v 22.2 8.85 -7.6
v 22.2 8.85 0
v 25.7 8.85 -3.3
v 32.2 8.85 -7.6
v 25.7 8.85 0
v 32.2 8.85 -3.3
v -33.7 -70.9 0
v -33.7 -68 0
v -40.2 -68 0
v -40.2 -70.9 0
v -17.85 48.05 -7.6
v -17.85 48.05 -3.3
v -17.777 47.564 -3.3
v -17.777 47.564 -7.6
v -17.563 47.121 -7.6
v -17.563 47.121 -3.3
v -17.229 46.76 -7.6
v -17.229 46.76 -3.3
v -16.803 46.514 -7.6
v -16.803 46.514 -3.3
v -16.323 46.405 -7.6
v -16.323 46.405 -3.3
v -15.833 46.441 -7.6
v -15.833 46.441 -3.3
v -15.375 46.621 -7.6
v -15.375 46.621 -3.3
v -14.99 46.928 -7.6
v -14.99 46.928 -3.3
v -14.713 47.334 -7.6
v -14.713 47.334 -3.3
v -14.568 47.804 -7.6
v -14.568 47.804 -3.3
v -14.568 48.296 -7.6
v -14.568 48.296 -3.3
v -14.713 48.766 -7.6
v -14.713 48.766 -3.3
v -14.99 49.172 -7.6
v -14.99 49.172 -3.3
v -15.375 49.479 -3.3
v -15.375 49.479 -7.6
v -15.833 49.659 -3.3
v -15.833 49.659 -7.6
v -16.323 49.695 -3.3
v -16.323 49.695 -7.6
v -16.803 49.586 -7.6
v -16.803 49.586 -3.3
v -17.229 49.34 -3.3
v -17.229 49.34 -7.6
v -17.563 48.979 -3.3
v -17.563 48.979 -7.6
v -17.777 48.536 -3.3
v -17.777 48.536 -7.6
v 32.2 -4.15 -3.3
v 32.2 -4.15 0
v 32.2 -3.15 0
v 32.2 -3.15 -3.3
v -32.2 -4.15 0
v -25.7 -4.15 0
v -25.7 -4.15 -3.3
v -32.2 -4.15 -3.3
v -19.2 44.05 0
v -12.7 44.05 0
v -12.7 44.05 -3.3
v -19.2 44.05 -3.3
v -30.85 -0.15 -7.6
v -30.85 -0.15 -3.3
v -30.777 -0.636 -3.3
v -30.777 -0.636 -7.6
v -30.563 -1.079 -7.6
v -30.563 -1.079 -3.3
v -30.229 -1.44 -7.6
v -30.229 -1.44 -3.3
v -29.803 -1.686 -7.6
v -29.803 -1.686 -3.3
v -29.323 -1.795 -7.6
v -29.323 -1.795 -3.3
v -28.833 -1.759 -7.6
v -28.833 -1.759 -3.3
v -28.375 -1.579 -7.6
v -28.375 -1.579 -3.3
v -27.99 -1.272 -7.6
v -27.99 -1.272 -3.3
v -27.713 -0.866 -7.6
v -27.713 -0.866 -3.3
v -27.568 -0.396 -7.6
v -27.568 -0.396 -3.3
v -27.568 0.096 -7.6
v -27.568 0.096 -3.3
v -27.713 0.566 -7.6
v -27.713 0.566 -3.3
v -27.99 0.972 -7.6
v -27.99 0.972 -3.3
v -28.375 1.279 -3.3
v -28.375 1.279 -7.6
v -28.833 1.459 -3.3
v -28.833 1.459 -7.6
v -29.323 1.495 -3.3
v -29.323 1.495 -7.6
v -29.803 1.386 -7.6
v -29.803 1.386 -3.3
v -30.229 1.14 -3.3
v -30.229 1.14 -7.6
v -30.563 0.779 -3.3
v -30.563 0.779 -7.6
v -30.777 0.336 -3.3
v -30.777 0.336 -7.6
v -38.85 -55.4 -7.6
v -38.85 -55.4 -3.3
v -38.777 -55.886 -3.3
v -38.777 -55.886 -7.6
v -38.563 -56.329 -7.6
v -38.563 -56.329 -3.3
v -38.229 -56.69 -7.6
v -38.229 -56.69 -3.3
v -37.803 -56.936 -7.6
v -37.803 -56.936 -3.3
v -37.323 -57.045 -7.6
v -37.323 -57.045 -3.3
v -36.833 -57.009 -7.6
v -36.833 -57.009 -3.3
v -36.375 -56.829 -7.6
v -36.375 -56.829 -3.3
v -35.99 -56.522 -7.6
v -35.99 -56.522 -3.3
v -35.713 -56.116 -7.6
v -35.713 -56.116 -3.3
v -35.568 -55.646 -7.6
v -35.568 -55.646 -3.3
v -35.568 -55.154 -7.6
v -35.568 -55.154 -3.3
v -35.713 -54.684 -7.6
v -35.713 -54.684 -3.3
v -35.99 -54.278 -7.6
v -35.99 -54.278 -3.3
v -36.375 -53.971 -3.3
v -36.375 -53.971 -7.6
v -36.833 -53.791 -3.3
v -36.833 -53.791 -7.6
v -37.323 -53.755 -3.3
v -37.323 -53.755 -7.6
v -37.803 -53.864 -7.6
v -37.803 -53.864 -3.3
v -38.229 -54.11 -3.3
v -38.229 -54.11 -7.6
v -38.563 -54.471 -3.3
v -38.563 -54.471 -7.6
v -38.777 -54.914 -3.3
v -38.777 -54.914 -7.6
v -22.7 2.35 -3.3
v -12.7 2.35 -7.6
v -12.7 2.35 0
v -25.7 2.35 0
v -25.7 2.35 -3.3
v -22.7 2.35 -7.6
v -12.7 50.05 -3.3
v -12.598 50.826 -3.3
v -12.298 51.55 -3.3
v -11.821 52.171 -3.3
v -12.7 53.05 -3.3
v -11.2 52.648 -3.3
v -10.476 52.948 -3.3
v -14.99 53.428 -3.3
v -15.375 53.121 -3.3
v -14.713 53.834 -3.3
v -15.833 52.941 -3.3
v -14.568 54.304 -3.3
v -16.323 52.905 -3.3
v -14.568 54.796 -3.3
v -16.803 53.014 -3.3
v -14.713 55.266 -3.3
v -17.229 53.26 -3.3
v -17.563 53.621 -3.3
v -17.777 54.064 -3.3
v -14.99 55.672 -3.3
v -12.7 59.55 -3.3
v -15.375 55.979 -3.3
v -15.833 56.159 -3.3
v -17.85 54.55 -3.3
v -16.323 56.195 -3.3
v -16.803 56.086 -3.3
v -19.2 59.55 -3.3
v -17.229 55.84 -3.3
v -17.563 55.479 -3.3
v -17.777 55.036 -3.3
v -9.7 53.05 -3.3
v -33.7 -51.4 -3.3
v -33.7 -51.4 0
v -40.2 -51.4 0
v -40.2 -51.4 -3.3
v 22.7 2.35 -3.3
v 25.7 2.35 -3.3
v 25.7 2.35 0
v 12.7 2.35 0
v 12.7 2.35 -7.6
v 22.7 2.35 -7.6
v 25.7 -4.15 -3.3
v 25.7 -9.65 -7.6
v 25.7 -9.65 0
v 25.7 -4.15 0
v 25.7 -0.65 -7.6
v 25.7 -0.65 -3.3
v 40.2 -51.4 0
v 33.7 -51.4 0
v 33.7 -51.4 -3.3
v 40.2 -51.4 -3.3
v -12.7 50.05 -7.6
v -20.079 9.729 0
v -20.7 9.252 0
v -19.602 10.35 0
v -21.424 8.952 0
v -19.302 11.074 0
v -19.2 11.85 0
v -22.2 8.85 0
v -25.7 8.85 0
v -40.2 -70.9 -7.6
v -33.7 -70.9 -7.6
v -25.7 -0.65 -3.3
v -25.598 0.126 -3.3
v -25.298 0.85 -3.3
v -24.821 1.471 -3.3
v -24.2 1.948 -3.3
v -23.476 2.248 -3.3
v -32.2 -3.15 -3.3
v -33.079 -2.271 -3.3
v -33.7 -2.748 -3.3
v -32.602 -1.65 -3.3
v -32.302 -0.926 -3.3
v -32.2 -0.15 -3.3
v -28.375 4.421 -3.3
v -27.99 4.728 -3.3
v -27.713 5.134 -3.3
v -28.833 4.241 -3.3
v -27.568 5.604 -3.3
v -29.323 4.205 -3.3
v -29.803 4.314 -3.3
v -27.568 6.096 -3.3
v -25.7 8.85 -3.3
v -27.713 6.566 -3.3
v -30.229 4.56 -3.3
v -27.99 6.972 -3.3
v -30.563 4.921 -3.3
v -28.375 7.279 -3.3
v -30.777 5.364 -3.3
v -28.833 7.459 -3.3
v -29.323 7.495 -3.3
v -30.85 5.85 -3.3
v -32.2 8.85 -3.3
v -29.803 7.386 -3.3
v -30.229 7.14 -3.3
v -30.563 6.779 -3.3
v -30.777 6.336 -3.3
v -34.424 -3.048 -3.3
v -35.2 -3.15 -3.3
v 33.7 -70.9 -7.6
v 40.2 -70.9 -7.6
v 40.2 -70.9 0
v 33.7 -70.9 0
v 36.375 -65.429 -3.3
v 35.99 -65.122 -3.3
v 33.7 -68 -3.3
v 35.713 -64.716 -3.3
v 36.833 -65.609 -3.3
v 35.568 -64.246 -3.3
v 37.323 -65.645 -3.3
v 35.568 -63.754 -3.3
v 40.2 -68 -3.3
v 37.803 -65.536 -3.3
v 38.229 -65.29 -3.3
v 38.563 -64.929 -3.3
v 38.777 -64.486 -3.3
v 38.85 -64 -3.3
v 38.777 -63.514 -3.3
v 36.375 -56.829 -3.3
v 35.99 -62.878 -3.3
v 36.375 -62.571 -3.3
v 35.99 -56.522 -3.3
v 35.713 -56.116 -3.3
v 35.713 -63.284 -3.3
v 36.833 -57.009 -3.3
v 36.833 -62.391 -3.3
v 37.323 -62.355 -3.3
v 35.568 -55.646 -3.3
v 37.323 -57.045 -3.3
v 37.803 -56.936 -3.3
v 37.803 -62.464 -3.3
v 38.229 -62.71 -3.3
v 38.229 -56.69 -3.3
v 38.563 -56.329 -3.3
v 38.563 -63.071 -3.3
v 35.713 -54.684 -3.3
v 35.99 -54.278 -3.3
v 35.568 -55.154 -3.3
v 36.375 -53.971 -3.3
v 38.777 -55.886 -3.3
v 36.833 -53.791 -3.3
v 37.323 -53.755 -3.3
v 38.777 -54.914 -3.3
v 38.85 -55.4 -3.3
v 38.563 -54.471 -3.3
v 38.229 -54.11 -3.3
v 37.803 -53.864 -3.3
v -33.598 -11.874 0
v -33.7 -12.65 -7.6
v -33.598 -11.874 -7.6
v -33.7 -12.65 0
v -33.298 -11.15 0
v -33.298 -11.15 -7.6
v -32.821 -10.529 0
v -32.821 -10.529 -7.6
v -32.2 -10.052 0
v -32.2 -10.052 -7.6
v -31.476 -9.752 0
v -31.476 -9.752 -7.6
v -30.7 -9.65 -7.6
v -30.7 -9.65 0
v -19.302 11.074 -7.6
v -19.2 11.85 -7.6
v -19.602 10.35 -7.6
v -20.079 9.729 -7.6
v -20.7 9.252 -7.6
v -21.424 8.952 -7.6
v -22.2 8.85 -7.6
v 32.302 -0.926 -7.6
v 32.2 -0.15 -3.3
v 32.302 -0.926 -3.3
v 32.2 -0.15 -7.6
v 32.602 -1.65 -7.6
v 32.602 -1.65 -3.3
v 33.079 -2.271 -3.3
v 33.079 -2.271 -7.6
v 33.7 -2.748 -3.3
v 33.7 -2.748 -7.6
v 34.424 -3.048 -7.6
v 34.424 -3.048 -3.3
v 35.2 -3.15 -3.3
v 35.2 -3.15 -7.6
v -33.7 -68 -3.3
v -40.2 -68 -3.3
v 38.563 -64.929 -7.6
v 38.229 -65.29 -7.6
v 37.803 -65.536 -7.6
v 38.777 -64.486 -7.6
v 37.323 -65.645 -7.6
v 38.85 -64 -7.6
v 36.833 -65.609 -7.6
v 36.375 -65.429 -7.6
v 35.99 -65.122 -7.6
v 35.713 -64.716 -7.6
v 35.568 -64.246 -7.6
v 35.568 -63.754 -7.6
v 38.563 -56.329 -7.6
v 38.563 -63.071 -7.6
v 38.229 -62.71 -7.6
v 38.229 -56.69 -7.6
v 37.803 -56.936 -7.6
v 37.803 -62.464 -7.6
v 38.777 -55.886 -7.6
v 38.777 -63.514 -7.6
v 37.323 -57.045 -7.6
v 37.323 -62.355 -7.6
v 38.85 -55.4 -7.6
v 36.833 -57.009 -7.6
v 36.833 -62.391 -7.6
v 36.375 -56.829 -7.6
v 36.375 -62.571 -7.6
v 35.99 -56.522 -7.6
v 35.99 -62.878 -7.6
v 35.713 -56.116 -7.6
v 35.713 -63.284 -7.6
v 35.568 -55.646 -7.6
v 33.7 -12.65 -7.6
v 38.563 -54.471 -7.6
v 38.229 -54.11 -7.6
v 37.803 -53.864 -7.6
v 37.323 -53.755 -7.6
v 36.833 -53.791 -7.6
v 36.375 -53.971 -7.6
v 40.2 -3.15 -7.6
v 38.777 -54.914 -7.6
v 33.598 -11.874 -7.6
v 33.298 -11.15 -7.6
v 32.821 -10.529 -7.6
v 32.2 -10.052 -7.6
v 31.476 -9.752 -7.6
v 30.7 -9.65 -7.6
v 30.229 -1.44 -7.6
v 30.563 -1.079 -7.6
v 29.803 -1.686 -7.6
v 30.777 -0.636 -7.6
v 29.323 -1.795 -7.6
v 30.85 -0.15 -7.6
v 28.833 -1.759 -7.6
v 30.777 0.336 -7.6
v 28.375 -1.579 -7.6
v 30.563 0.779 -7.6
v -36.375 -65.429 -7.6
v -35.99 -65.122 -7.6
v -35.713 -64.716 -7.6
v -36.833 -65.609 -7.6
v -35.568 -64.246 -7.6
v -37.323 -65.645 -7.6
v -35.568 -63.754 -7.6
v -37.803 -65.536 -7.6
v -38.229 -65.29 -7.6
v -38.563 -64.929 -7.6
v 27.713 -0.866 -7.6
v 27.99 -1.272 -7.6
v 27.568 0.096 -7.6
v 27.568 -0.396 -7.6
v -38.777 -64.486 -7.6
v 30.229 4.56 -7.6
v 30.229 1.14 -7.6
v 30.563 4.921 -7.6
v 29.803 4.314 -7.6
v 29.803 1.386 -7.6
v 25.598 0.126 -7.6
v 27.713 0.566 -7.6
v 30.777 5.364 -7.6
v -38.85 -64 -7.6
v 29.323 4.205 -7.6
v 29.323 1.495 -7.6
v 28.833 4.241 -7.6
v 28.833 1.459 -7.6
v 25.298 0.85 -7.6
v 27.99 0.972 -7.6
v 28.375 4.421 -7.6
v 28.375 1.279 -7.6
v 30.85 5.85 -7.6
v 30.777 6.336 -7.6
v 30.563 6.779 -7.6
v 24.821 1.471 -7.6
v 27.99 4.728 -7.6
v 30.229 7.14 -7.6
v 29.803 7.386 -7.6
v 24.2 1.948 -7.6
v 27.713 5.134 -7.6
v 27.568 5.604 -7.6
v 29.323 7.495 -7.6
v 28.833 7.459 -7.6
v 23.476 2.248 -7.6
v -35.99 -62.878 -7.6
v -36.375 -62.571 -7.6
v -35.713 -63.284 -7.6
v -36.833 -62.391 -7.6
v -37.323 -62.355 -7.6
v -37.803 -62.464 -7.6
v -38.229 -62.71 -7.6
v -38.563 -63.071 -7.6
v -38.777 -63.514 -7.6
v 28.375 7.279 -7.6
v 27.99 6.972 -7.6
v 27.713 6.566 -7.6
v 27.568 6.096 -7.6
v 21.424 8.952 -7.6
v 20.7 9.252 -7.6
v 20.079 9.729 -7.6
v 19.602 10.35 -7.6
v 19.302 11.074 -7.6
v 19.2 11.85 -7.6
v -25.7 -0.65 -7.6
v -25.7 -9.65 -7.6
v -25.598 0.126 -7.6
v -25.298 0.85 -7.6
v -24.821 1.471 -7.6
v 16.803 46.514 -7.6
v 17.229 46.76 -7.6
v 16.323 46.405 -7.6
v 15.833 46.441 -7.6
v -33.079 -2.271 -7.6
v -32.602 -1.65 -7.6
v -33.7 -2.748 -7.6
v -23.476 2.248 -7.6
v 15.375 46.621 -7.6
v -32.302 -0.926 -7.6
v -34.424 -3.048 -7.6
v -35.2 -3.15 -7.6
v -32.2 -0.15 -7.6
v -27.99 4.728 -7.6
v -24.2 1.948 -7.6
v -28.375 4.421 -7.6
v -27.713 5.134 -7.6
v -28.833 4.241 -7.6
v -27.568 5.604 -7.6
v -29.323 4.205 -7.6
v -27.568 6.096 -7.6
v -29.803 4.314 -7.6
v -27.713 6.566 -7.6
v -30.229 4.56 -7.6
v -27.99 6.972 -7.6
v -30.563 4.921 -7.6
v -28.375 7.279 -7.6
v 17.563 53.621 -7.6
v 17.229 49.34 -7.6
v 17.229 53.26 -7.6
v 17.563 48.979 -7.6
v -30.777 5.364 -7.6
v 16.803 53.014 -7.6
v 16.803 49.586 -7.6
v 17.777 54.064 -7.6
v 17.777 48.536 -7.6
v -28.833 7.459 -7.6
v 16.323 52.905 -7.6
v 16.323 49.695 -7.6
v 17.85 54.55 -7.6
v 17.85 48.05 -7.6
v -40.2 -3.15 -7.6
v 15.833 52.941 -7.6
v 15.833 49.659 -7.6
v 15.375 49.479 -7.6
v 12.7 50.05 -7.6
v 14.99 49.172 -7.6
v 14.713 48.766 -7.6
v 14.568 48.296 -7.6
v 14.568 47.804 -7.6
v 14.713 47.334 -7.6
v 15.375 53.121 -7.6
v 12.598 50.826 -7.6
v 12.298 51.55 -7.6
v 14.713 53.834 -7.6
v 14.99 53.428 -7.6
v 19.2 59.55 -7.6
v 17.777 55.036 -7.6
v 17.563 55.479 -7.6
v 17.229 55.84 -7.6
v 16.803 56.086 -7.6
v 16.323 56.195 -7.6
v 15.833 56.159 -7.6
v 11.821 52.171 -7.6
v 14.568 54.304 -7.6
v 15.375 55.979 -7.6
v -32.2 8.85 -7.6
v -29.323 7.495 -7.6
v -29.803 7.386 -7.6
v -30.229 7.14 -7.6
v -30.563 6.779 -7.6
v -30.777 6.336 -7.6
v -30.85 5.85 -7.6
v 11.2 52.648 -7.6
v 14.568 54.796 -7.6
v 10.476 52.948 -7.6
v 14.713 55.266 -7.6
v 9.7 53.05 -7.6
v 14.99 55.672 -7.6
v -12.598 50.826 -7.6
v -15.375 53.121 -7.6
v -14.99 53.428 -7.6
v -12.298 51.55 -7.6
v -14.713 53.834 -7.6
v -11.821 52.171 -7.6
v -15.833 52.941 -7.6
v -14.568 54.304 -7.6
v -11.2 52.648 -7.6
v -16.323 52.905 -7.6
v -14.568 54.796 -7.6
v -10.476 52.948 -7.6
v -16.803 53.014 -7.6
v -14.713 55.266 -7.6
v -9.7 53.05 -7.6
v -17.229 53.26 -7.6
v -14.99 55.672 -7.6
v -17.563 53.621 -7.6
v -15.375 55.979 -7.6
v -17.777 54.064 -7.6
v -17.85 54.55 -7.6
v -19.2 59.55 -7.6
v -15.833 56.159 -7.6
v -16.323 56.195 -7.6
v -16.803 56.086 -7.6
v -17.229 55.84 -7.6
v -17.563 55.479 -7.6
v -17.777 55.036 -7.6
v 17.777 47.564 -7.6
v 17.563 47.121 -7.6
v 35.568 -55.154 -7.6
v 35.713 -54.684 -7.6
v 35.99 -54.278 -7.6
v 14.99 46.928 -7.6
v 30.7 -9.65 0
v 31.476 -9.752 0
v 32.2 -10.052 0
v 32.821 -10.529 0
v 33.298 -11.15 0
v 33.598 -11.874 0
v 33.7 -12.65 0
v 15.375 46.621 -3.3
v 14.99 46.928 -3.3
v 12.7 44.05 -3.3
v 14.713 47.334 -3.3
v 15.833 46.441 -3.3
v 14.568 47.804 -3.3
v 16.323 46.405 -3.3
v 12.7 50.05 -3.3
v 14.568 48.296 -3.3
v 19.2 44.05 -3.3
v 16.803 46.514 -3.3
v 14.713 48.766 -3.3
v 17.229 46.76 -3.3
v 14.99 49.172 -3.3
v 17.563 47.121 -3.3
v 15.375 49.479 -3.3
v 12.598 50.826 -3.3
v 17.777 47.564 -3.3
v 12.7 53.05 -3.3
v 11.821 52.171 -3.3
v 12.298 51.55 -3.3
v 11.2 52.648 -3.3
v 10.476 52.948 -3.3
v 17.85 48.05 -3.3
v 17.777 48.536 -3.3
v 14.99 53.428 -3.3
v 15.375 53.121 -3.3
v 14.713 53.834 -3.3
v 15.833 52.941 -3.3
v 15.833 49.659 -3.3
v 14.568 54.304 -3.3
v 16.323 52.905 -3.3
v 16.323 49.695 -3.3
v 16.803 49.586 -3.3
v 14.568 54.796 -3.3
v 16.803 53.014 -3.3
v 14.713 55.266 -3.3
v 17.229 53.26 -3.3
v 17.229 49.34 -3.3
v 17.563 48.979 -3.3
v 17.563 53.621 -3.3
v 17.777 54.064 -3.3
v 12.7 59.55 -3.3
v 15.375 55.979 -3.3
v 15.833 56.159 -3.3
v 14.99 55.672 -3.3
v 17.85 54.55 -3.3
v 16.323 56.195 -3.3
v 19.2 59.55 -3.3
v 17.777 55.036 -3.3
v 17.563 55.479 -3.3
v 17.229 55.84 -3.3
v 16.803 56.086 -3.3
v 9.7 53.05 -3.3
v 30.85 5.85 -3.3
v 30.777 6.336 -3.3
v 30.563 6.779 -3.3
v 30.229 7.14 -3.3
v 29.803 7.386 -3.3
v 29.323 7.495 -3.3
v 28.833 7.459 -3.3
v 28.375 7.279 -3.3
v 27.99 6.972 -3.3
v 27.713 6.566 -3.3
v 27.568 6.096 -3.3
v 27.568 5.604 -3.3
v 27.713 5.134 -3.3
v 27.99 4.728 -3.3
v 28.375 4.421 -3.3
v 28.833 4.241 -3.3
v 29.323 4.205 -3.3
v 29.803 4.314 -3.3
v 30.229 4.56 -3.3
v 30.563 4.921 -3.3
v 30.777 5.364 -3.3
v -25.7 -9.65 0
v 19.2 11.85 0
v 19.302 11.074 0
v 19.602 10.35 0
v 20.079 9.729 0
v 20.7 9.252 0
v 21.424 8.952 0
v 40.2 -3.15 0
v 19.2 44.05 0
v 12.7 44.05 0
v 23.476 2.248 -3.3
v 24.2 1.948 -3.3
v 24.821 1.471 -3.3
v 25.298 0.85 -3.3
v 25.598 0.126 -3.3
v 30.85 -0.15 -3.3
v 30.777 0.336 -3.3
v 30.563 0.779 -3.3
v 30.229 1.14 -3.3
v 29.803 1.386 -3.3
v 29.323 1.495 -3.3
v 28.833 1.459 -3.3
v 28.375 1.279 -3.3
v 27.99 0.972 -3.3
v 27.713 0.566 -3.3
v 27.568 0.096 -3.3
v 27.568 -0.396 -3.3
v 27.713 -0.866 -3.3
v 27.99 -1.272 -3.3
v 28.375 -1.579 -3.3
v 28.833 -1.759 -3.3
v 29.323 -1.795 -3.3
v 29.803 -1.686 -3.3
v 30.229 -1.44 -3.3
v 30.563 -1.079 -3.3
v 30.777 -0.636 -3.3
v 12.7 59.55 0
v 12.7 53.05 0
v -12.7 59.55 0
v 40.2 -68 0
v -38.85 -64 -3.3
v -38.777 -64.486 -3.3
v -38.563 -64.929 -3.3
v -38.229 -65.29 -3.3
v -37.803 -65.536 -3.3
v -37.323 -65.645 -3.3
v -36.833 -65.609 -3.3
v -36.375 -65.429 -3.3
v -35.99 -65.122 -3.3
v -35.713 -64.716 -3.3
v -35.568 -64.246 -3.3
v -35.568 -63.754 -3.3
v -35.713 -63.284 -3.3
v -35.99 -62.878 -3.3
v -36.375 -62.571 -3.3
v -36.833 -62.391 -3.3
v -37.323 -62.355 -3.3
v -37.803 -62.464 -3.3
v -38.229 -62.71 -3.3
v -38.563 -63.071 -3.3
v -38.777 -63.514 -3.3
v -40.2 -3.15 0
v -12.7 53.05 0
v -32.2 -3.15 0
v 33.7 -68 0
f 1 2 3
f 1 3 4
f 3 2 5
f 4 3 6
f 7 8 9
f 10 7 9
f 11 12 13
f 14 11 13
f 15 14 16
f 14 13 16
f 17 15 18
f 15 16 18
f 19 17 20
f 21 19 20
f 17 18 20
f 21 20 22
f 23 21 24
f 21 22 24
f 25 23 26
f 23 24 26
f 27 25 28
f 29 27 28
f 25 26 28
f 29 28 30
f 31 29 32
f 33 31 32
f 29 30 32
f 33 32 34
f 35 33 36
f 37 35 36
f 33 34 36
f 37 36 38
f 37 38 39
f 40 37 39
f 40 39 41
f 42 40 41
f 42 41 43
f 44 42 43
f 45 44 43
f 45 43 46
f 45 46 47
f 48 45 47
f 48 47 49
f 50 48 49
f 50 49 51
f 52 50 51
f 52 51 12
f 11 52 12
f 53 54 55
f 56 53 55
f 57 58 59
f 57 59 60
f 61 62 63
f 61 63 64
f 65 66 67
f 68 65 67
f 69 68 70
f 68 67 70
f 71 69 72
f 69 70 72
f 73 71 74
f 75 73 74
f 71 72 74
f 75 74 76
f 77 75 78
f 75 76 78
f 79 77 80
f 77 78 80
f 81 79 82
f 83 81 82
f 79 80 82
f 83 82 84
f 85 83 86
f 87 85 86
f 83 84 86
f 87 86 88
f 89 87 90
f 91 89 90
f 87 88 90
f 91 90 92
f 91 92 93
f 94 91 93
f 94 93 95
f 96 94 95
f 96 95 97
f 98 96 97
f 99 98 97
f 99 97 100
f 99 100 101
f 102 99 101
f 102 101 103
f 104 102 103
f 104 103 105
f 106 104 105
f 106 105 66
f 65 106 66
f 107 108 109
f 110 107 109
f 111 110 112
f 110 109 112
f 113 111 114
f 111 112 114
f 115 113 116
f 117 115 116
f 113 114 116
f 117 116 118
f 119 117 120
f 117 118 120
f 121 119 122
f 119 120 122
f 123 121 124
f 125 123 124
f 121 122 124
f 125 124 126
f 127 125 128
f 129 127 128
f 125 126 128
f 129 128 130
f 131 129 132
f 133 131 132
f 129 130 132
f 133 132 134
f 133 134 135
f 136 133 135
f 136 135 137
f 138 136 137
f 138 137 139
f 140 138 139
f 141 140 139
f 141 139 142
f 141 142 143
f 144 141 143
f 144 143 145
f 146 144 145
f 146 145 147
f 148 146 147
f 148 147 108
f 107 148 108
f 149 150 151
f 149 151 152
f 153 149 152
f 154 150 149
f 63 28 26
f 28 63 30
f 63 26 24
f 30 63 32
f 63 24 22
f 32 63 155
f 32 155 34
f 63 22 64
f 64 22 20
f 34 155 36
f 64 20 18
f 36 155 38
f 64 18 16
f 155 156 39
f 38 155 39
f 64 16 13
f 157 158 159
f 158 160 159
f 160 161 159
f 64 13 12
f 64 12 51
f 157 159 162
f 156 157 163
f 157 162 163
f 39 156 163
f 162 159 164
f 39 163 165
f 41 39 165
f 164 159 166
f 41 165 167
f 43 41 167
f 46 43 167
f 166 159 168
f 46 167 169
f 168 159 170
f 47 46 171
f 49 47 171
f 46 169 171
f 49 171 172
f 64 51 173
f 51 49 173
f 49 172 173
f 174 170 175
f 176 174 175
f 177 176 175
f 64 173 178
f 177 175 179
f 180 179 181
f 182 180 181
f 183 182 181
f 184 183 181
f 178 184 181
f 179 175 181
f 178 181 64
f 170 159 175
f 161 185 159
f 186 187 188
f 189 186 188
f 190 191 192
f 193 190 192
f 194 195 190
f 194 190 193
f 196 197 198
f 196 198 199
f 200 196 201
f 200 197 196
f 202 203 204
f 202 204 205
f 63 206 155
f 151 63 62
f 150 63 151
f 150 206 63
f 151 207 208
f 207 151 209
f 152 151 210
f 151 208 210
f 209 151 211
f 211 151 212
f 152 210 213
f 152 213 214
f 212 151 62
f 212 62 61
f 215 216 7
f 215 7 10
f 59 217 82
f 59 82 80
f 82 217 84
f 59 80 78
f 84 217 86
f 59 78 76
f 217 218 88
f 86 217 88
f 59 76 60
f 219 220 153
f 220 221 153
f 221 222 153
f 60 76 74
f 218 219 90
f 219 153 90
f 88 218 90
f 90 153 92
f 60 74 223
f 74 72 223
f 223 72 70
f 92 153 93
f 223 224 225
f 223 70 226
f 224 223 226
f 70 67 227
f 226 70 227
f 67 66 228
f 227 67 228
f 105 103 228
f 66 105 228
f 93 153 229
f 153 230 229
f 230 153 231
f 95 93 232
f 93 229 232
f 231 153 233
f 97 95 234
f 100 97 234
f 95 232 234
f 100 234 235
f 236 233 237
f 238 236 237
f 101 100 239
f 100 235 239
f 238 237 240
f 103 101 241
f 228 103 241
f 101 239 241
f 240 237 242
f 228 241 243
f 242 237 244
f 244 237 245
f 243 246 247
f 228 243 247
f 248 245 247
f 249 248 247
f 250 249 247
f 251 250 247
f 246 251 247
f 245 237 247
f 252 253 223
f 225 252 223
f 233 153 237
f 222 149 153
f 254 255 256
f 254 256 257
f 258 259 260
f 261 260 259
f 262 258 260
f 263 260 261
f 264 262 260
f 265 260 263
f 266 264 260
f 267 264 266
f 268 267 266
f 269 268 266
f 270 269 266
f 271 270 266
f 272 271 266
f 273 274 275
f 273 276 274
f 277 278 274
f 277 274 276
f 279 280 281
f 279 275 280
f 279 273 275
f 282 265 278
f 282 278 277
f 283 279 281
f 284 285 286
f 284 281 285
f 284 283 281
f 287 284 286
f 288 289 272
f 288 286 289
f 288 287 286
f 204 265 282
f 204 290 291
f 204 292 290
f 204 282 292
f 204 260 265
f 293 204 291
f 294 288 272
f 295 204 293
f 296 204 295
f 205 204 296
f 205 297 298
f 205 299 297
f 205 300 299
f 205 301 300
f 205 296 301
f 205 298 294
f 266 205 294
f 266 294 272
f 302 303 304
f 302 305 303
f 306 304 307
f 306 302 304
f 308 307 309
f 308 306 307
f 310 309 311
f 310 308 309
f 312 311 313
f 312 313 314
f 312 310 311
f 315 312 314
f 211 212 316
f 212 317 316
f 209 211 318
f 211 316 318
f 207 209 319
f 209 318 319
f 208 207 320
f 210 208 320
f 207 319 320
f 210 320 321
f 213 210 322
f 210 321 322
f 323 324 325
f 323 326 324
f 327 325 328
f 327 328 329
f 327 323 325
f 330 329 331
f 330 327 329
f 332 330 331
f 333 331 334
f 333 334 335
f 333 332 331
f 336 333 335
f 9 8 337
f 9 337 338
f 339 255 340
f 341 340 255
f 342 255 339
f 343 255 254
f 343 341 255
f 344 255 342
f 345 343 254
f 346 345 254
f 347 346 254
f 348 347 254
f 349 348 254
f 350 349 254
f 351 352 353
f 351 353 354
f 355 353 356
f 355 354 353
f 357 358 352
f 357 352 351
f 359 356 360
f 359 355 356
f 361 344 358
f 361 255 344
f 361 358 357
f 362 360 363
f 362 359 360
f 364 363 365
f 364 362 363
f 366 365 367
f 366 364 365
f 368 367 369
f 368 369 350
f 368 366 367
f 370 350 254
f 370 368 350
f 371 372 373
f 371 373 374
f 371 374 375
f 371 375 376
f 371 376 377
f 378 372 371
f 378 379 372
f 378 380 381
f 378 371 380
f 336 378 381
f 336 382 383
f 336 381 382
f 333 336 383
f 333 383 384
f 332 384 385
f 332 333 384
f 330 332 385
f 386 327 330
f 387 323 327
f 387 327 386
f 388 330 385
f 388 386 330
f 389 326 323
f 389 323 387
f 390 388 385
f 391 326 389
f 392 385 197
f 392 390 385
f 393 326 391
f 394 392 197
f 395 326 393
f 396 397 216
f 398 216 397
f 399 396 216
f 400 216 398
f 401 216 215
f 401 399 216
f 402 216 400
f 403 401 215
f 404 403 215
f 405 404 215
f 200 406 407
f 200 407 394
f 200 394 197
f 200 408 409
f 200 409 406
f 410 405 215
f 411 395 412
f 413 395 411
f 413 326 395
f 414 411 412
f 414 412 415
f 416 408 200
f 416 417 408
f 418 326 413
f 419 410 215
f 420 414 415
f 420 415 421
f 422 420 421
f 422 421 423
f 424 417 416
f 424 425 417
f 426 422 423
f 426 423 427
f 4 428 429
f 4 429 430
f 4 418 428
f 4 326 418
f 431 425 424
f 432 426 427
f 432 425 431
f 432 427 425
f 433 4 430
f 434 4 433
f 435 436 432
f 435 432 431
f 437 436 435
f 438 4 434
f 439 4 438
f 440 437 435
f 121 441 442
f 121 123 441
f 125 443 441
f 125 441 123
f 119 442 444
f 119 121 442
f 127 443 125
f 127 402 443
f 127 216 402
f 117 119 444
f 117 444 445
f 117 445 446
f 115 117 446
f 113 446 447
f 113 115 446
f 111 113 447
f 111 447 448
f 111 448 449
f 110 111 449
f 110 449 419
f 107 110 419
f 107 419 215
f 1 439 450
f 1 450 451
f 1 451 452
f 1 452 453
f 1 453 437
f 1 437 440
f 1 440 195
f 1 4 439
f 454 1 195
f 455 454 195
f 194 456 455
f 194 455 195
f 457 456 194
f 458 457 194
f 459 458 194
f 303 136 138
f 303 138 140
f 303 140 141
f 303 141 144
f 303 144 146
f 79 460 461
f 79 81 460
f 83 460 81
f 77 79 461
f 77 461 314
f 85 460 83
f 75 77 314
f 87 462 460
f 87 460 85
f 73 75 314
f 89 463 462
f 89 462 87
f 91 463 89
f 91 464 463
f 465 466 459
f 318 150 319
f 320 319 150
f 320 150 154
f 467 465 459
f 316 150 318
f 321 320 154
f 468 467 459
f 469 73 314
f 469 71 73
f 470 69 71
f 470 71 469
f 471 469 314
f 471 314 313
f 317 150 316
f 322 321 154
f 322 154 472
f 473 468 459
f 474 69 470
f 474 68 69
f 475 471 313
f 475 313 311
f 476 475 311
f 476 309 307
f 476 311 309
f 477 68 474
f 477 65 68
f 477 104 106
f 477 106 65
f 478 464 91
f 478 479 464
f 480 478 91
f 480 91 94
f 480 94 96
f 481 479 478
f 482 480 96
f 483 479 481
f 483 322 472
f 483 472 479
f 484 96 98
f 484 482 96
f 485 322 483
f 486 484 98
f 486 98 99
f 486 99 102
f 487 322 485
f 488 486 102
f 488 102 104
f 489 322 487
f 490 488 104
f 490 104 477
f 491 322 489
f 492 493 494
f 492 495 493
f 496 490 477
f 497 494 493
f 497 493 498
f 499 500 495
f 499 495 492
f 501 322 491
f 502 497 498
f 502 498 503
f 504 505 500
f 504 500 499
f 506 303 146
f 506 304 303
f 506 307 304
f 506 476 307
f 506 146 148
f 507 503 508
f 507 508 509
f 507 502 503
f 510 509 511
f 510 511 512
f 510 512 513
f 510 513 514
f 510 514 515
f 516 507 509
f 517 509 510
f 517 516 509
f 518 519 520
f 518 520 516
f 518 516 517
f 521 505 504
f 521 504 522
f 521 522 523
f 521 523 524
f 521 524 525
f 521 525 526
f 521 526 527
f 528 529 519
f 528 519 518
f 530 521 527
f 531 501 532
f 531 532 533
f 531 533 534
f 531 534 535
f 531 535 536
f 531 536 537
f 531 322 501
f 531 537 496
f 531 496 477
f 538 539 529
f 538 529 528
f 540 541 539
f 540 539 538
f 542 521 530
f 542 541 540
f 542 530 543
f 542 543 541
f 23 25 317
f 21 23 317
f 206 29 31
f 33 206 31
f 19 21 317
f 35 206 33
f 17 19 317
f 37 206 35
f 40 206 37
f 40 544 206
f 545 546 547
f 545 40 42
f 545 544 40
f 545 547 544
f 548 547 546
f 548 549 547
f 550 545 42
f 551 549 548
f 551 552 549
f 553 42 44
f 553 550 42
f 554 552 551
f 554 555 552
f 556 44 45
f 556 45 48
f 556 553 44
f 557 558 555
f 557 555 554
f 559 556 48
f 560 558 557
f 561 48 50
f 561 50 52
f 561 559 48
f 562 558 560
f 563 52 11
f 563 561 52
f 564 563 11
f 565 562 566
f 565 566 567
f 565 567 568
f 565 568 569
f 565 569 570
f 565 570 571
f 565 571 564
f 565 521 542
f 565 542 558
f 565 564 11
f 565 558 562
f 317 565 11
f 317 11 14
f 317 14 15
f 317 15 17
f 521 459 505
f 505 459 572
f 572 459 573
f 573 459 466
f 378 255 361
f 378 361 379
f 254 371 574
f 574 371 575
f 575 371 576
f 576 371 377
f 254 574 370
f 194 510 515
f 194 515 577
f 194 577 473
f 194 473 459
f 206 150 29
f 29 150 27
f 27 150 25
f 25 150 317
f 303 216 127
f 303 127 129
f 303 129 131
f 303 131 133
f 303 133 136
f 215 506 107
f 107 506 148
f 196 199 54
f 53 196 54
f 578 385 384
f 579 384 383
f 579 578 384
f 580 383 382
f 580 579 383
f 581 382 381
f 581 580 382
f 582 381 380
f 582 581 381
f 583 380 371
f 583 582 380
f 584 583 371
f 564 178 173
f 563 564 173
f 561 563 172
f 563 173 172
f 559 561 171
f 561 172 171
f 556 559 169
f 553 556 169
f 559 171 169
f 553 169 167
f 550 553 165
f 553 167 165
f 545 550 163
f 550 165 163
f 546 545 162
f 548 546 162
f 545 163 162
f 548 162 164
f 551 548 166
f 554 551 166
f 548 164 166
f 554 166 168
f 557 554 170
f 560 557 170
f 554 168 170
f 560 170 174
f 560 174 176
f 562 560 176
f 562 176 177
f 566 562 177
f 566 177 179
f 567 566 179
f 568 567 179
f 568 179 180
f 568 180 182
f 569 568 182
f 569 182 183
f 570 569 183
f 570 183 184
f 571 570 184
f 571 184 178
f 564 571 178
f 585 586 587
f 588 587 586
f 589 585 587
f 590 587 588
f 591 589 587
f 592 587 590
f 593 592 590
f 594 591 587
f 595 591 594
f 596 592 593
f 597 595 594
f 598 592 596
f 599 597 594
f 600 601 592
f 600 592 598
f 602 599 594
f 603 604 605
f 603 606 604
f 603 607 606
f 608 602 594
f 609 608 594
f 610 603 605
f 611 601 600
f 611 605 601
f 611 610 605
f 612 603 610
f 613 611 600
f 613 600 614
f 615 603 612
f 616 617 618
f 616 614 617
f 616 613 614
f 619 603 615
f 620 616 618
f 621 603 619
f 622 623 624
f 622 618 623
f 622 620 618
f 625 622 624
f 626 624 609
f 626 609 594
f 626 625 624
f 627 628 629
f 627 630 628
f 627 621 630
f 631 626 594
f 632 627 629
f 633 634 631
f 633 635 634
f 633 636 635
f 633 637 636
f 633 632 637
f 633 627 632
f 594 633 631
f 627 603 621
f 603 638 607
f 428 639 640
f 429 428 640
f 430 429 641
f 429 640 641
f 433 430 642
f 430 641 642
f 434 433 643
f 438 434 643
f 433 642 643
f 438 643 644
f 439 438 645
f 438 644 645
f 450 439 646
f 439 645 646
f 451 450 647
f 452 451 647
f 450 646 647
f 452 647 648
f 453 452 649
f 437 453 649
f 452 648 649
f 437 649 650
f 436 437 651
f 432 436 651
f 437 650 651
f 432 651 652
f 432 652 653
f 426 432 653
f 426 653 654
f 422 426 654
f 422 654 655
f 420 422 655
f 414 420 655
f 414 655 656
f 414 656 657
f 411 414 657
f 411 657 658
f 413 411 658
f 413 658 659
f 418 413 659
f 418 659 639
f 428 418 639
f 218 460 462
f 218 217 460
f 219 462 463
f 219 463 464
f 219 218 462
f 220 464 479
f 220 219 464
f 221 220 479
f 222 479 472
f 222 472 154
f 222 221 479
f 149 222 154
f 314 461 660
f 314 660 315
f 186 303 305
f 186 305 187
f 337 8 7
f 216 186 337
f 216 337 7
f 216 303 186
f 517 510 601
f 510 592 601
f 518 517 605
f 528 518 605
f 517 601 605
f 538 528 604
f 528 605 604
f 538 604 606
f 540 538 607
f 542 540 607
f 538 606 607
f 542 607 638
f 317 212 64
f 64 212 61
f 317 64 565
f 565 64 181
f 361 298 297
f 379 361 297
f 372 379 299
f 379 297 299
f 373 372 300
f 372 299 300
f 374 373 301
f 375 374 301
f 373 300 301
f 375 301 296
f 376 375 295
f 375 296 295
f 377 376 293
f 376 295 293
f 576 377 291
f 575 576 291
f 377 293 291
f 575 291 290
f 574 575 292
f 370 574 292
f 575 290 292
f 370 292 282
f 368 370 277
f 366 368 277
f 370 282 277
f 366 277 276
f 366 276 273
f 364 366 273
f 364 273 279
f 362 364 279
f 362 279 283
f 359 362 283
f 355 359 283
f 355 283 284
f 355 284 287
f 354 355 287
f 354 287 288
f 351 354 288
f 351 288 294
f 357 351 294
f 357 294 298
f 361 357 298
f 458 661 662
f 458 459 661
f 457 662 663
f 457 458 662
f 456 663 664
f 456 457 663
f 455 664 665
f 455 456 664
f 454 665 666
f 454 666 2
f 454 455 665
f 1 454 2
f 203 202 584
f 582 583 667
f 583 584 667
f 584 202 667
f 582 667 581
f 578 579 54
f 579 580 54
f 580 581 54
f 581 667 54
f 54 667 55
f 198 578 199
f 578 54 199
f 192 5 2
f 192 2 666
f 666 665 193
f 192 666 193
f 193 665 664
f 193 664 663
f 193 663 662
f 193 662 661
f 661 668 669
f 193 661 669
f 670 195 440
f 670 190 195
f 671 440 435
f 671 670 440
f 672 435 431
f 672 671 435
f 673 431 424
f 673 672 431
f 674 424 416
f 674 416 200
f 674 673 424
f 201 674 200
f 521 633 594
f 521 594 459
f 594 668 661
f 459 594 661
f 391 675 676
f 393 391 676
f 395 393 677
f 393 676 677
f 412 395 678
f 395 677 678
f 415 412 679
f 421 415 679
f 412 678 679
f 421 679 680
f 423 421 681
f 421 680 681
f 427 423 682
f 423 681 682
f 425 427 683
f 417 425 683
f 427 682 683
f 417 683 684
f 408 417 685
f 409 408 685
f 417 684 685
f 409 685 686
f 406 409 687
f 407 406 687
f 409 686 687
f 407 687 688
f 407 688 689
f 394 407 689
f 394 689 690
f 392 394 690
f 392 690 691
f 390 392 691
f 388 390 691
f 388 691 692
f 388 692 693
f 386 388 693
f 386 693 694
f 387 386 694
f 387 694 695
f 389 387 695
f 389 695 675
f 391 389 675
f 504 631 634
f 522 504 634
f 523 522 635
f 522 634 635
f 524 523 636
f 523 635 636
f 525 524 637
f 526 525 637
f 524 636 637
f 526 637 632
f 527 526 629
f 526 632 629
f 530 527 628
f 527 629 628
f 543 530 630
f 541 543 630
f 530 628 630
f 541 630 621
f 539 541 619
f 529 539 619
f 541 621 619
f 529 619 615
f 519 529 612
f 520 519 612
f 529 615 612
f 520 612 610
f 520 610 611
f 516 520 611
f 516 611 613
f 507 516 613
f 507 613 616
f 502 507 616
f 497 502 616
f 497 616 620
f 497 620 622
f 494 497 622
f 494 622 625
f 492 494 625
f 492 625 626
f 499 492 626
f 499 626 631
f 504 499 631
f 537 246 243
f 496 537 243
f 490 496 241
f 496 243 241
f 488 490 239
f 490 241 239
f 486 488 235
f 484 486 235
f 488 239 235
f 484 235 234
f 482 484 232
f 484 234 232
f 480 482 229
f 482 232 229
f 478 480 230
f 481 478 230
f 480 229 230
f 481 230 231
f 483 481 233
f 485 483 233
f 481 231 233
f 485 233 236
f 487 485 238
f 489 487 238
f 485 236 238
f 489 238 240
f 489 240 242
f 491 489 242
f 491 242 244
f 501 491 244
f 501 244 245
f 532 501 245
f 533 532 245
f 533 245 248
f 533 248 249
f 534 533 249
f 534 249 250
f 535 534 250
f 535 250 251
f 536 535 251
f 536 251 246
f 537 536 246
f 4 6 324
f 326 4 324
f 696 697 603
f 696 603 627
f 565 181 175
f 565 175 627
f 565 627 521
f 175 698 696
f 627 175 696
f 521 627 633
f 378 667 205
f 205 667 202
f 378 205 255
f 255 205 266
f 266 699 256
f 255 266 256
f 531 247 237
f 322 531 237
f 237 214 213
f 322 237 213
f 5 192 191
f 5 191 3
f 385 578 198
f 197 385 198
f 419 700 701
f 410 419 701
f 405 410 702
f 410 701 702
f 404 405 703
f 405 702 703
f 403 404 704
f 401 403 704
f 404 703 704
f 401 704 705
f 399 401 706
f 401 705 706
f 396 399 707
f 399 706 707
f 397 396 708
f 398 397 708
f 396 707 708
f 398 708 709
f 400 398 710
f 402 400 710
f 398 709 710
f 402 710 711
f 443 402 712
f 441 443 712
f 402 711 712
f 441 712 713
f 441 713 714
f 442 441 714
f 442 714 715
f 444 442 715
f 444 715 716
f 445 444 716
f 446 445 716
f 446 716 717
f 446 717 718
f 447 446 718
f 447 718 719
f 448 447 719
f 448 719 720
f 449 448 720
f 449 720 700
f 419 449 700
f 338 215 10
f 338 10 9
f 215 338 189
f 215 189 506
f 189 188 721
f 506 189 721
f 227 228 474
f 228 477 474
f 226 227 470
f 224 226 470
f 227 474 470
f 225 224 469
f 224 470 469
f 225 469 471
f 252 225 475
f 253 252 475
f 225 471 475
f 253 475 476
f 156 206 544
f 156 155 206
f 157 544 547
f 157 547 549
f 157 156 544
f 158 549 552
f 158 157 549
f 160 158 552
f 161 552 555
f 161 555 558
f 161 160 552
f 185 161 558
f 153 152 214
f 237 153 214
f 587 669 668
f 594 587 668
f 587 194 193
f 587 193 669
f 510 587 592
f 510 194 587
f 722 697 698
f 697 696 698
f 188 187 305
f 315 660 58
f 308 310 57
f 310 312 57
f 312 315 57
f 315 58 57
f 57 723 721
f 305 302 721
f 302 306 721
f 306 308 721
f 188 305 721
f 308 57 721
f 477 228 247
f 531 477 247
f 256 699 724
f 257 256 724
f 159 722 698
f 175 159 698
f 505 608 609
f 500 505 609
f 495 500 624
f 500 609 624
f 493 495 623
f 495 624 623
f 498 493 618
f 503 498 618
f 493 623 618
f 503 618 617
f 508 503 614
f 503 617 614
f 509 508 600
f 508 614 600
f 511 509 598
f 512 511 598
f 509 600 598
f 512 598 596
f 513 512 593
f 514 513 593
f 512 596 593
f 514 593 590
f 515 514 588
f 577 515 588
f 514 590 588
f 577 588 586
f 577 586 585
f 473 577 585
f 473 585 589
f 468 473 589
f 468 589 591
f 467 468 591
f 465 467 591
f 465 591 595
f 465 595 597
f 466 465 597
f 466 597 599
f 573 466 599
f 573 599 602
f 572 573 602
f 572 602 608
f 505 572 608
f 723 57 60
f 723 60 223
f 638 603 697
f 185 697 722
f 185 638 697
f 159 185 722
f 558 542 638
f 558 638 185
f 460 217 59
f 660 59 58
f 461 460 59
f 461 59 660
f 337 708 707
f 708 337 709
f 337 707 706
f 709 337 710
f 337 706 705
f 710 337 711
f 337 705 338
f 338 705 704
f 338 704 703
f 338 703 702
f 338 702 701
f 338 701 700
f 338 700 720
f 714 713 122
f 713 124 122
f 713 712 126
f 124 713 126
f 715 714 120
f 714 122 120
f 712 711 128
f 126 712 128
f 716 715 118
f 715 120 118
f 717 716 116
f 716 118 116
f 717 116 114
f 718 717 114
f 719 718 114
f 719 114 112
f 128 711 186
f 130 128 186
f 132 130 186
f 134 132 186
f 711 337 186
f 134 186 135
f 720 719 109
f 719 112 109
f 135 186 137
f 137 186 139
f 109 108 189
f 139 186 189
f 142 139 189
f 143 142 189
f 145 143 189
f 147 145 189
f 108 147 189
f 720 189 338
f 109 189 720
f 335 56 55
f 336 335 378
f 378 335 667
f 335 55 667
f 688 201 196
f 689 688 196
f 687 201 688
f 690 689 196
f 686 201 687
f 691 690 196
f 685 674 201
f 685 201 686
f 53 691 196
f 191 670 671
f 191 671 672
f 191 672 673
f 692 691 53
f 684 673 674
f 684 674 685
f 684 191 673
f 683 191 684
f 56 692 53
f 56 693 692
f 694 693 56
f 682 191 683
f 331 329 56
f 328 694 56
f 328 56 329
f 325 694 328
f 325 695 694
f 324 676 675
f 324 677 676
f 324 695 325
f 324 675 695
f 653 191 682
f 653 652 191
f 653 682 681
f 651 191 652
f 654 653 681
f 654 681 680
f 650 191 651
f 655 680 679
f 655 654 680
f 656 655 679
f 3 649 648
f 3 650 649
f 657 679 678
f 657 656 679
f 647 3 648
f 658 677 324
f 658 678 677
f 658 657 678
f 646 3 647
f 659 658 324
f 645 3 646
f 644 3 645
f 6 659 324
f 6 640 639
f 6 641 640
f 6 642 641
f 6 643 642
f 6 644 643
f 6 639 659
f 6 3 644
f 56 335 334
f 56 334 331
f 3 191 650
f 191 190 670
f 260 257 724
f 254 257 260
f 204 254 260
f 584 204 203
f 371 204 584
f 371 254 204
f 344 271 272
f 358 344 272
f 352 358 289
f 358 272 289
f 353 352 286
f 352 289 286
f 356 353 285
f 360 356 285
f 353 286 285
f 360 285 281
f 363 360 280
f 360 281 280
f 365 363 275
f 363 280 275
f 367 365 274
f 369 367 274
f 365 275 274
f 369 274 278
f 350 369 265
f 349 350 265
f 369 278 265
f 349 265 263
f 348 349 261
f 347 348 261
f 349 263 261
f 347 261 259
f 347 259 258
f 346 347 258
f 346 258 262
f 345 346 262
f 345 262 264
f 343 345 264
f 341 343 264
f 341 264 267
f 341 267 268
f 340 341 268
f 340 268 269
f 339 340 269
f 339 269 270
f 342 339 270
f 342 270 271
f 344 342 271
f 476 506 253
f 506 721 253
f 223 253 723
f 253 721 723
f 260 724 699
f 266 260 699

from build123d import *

# Parameters (mm, degrees)
SKETCH1_R           = 1.65
BOSS_EXTRUDE1_DEPTH = 7.6
CUT_EXTRUDE1_REACH  = 89.547
SKETCH3_W           = 6.5
SKETCH3_H           = 15.5
SKETCH3_H_2         = 14
SKETCH3_H_3         = 16.6
CUT_EXTRUDE2_DEPTH  = 3.3
FILLET1_R           = 3


with BuildPart() as part:
    # Sketch1 → Boss-Extrude1 (new body)
    with BuildSketch(Plane.XY):
        Polygon((19.2, 59.55), (19.2, 8.85), (32.2, 8.85), (32.2, -3.15), (40.2, -3.15), (40.2, -77.4), (-40.2, -77.4), (-40.2, -3.15), (-32.2, -3.15), (-32.2, 8.85), (-19.2, 8.85), (-19.2, 59.55), align=None)
        with Locations((29.2, 5.85)):
            Circle(SKETCH1_R, mode=Mode.SUBTRACT)
        with Locations((29.2, -0.15)):
            Circle(SKETCH1_R, mode=Mode.SUBTRACT)
        with Locations((37.2, -55.4)):
            Circle(SKETCH1_R, mode=Mode.SUBTRACT)
        with Locations((37.2, -64)):
            Circle(SKETCH1_R, mode=Mode.SUBTRACT)
        with Locations((16.2, 48.05)):
            Circle(SKETCH1_R, mode=Mode.SUBTRACT)
        with Locations((16.2, 54.55)):
            Circle(SKETCH1_R, mode=Mode.SUBTRACT)
        with Locations(Location((-16.2, 54.55, 0), (0, 0, 180))):
            Circle(SKETCH1_R, mode=Mode.SUBTRACT)
        with Locations(Location((-16.2, 48.05, 0), (0, 0, 180))):
            Circle(SKETCH1_R, mode=Mode.SUBTRACT)
        with Locations(Location((-37.2, -64, 0), (0, 0, 180))):
            Circle(SKETCH1_R, mode=Mode.SUBTRACT)
        with Locations(Location((-37.2, -55.4, 0), (0, 0, 180))):
            Circle(SKETCH1_R, mode=Mode.SUBTRACT)
        with Locations(Location((-29.2, -0.15, 0), (0, 0, 180))):
            Circle(SKETCH1_R, mode=Mode.SUBTRACT)
        with Locations(Location((-29.2, 5.85, 0), (0, 0, 180))):
            Circle(SKETCH1_R, mode=Mode.SUBTRACT)
    extrude(amount=-BOSS_EXTRUDE1_DEPTH)

    # Sketch2 → Cut-Extrude1 (cut, up to next)
    with BuildSketch(Plane(origin=(0, 0, -7.6), x_dir=(-1, 0, 0), z_dir=(0, 0, -1)), mode=Mode.PRIVATE) as cut_extrude1_sk1:
        Polygon((-12.7, 2.35), (-12.7, 53.05), (12.7, 53.05), (12.7, 2.35), (25.7, 2.35), (25.7, -9.65), (33.7, -9.65), (33.7, -70.9), (40.2, -70.9), (40.2, -77.4), (-40.2, -77.4), (-40.2, -70.9), (-33.7, -70.9), (-33.7, -9.65), (-25.7, -9.65), (-25.7, 2.35), align=None)
    cut_extrude1_tool1 = extrude(cut_extrude1_sk1.sketch, amount=-CUT_EXTRUDE1_REACH, mode=Mode.PRIVATE) & part.part
    add(cut_extrude1_tool1.solids().sort_by_distance((0, -26.176143, -7.6))[0], mode=Mode.SUBTRACT)

    # Sketch3 → Cut-Extrude2 (cut)
    with BuildSketch(Plane(origin=(0, 0, 0), x_dir=(-1, 0, 0), z_dir=(0, 0, -1))):
        with Locations((15.95, 51.8)):
            Rectangle(SKETCH3_W, SKETCH3_H)
        with Locations((28.95, 2.85)):
            Rectangle(SKETCH3_W, SKETCH3_H_2)
        with Locations((36.95, -59.7)):
            Rectangle(SKETCH3_W, SKETCH3_H_3)
    cut_extrude2 = extrude(amount=CUT_EXTRUDE2_DEPTH, mode=Mode.SUBTRACT)

    # Mirror1: Cut-Extrude2 across plane
    add(cut_extrude2.mirror(Plane(origin=(0, 0, 0), x_dir=(0, 0, 1), z_dir=(1, 0, 0))), mode=Mode.SUBTRACT)

    # Fillet1
    fillet1_edges = [part.edges().sort_by_distance(p)[0] for p in [
        (-25.7, 2.35, -5.45),
        (-12.7, 53.05, -5.45),
        (19.2, 8.85, -3.8),
        (32.2, -3.15, -5.45),
        (25.7, 2.35, -5.45),
        (12.7, 53.05, -5.45),
        (-32.2, -3.15, -5.45),
        (-19.2, 8.85, -3.8),
        (-33.7, -9.65, -3.8),
        (33.7, -9.65, -3.8),
    ]]
    fillet(fillet1_edges, radius=FILLET1_R)


solid = part.part
